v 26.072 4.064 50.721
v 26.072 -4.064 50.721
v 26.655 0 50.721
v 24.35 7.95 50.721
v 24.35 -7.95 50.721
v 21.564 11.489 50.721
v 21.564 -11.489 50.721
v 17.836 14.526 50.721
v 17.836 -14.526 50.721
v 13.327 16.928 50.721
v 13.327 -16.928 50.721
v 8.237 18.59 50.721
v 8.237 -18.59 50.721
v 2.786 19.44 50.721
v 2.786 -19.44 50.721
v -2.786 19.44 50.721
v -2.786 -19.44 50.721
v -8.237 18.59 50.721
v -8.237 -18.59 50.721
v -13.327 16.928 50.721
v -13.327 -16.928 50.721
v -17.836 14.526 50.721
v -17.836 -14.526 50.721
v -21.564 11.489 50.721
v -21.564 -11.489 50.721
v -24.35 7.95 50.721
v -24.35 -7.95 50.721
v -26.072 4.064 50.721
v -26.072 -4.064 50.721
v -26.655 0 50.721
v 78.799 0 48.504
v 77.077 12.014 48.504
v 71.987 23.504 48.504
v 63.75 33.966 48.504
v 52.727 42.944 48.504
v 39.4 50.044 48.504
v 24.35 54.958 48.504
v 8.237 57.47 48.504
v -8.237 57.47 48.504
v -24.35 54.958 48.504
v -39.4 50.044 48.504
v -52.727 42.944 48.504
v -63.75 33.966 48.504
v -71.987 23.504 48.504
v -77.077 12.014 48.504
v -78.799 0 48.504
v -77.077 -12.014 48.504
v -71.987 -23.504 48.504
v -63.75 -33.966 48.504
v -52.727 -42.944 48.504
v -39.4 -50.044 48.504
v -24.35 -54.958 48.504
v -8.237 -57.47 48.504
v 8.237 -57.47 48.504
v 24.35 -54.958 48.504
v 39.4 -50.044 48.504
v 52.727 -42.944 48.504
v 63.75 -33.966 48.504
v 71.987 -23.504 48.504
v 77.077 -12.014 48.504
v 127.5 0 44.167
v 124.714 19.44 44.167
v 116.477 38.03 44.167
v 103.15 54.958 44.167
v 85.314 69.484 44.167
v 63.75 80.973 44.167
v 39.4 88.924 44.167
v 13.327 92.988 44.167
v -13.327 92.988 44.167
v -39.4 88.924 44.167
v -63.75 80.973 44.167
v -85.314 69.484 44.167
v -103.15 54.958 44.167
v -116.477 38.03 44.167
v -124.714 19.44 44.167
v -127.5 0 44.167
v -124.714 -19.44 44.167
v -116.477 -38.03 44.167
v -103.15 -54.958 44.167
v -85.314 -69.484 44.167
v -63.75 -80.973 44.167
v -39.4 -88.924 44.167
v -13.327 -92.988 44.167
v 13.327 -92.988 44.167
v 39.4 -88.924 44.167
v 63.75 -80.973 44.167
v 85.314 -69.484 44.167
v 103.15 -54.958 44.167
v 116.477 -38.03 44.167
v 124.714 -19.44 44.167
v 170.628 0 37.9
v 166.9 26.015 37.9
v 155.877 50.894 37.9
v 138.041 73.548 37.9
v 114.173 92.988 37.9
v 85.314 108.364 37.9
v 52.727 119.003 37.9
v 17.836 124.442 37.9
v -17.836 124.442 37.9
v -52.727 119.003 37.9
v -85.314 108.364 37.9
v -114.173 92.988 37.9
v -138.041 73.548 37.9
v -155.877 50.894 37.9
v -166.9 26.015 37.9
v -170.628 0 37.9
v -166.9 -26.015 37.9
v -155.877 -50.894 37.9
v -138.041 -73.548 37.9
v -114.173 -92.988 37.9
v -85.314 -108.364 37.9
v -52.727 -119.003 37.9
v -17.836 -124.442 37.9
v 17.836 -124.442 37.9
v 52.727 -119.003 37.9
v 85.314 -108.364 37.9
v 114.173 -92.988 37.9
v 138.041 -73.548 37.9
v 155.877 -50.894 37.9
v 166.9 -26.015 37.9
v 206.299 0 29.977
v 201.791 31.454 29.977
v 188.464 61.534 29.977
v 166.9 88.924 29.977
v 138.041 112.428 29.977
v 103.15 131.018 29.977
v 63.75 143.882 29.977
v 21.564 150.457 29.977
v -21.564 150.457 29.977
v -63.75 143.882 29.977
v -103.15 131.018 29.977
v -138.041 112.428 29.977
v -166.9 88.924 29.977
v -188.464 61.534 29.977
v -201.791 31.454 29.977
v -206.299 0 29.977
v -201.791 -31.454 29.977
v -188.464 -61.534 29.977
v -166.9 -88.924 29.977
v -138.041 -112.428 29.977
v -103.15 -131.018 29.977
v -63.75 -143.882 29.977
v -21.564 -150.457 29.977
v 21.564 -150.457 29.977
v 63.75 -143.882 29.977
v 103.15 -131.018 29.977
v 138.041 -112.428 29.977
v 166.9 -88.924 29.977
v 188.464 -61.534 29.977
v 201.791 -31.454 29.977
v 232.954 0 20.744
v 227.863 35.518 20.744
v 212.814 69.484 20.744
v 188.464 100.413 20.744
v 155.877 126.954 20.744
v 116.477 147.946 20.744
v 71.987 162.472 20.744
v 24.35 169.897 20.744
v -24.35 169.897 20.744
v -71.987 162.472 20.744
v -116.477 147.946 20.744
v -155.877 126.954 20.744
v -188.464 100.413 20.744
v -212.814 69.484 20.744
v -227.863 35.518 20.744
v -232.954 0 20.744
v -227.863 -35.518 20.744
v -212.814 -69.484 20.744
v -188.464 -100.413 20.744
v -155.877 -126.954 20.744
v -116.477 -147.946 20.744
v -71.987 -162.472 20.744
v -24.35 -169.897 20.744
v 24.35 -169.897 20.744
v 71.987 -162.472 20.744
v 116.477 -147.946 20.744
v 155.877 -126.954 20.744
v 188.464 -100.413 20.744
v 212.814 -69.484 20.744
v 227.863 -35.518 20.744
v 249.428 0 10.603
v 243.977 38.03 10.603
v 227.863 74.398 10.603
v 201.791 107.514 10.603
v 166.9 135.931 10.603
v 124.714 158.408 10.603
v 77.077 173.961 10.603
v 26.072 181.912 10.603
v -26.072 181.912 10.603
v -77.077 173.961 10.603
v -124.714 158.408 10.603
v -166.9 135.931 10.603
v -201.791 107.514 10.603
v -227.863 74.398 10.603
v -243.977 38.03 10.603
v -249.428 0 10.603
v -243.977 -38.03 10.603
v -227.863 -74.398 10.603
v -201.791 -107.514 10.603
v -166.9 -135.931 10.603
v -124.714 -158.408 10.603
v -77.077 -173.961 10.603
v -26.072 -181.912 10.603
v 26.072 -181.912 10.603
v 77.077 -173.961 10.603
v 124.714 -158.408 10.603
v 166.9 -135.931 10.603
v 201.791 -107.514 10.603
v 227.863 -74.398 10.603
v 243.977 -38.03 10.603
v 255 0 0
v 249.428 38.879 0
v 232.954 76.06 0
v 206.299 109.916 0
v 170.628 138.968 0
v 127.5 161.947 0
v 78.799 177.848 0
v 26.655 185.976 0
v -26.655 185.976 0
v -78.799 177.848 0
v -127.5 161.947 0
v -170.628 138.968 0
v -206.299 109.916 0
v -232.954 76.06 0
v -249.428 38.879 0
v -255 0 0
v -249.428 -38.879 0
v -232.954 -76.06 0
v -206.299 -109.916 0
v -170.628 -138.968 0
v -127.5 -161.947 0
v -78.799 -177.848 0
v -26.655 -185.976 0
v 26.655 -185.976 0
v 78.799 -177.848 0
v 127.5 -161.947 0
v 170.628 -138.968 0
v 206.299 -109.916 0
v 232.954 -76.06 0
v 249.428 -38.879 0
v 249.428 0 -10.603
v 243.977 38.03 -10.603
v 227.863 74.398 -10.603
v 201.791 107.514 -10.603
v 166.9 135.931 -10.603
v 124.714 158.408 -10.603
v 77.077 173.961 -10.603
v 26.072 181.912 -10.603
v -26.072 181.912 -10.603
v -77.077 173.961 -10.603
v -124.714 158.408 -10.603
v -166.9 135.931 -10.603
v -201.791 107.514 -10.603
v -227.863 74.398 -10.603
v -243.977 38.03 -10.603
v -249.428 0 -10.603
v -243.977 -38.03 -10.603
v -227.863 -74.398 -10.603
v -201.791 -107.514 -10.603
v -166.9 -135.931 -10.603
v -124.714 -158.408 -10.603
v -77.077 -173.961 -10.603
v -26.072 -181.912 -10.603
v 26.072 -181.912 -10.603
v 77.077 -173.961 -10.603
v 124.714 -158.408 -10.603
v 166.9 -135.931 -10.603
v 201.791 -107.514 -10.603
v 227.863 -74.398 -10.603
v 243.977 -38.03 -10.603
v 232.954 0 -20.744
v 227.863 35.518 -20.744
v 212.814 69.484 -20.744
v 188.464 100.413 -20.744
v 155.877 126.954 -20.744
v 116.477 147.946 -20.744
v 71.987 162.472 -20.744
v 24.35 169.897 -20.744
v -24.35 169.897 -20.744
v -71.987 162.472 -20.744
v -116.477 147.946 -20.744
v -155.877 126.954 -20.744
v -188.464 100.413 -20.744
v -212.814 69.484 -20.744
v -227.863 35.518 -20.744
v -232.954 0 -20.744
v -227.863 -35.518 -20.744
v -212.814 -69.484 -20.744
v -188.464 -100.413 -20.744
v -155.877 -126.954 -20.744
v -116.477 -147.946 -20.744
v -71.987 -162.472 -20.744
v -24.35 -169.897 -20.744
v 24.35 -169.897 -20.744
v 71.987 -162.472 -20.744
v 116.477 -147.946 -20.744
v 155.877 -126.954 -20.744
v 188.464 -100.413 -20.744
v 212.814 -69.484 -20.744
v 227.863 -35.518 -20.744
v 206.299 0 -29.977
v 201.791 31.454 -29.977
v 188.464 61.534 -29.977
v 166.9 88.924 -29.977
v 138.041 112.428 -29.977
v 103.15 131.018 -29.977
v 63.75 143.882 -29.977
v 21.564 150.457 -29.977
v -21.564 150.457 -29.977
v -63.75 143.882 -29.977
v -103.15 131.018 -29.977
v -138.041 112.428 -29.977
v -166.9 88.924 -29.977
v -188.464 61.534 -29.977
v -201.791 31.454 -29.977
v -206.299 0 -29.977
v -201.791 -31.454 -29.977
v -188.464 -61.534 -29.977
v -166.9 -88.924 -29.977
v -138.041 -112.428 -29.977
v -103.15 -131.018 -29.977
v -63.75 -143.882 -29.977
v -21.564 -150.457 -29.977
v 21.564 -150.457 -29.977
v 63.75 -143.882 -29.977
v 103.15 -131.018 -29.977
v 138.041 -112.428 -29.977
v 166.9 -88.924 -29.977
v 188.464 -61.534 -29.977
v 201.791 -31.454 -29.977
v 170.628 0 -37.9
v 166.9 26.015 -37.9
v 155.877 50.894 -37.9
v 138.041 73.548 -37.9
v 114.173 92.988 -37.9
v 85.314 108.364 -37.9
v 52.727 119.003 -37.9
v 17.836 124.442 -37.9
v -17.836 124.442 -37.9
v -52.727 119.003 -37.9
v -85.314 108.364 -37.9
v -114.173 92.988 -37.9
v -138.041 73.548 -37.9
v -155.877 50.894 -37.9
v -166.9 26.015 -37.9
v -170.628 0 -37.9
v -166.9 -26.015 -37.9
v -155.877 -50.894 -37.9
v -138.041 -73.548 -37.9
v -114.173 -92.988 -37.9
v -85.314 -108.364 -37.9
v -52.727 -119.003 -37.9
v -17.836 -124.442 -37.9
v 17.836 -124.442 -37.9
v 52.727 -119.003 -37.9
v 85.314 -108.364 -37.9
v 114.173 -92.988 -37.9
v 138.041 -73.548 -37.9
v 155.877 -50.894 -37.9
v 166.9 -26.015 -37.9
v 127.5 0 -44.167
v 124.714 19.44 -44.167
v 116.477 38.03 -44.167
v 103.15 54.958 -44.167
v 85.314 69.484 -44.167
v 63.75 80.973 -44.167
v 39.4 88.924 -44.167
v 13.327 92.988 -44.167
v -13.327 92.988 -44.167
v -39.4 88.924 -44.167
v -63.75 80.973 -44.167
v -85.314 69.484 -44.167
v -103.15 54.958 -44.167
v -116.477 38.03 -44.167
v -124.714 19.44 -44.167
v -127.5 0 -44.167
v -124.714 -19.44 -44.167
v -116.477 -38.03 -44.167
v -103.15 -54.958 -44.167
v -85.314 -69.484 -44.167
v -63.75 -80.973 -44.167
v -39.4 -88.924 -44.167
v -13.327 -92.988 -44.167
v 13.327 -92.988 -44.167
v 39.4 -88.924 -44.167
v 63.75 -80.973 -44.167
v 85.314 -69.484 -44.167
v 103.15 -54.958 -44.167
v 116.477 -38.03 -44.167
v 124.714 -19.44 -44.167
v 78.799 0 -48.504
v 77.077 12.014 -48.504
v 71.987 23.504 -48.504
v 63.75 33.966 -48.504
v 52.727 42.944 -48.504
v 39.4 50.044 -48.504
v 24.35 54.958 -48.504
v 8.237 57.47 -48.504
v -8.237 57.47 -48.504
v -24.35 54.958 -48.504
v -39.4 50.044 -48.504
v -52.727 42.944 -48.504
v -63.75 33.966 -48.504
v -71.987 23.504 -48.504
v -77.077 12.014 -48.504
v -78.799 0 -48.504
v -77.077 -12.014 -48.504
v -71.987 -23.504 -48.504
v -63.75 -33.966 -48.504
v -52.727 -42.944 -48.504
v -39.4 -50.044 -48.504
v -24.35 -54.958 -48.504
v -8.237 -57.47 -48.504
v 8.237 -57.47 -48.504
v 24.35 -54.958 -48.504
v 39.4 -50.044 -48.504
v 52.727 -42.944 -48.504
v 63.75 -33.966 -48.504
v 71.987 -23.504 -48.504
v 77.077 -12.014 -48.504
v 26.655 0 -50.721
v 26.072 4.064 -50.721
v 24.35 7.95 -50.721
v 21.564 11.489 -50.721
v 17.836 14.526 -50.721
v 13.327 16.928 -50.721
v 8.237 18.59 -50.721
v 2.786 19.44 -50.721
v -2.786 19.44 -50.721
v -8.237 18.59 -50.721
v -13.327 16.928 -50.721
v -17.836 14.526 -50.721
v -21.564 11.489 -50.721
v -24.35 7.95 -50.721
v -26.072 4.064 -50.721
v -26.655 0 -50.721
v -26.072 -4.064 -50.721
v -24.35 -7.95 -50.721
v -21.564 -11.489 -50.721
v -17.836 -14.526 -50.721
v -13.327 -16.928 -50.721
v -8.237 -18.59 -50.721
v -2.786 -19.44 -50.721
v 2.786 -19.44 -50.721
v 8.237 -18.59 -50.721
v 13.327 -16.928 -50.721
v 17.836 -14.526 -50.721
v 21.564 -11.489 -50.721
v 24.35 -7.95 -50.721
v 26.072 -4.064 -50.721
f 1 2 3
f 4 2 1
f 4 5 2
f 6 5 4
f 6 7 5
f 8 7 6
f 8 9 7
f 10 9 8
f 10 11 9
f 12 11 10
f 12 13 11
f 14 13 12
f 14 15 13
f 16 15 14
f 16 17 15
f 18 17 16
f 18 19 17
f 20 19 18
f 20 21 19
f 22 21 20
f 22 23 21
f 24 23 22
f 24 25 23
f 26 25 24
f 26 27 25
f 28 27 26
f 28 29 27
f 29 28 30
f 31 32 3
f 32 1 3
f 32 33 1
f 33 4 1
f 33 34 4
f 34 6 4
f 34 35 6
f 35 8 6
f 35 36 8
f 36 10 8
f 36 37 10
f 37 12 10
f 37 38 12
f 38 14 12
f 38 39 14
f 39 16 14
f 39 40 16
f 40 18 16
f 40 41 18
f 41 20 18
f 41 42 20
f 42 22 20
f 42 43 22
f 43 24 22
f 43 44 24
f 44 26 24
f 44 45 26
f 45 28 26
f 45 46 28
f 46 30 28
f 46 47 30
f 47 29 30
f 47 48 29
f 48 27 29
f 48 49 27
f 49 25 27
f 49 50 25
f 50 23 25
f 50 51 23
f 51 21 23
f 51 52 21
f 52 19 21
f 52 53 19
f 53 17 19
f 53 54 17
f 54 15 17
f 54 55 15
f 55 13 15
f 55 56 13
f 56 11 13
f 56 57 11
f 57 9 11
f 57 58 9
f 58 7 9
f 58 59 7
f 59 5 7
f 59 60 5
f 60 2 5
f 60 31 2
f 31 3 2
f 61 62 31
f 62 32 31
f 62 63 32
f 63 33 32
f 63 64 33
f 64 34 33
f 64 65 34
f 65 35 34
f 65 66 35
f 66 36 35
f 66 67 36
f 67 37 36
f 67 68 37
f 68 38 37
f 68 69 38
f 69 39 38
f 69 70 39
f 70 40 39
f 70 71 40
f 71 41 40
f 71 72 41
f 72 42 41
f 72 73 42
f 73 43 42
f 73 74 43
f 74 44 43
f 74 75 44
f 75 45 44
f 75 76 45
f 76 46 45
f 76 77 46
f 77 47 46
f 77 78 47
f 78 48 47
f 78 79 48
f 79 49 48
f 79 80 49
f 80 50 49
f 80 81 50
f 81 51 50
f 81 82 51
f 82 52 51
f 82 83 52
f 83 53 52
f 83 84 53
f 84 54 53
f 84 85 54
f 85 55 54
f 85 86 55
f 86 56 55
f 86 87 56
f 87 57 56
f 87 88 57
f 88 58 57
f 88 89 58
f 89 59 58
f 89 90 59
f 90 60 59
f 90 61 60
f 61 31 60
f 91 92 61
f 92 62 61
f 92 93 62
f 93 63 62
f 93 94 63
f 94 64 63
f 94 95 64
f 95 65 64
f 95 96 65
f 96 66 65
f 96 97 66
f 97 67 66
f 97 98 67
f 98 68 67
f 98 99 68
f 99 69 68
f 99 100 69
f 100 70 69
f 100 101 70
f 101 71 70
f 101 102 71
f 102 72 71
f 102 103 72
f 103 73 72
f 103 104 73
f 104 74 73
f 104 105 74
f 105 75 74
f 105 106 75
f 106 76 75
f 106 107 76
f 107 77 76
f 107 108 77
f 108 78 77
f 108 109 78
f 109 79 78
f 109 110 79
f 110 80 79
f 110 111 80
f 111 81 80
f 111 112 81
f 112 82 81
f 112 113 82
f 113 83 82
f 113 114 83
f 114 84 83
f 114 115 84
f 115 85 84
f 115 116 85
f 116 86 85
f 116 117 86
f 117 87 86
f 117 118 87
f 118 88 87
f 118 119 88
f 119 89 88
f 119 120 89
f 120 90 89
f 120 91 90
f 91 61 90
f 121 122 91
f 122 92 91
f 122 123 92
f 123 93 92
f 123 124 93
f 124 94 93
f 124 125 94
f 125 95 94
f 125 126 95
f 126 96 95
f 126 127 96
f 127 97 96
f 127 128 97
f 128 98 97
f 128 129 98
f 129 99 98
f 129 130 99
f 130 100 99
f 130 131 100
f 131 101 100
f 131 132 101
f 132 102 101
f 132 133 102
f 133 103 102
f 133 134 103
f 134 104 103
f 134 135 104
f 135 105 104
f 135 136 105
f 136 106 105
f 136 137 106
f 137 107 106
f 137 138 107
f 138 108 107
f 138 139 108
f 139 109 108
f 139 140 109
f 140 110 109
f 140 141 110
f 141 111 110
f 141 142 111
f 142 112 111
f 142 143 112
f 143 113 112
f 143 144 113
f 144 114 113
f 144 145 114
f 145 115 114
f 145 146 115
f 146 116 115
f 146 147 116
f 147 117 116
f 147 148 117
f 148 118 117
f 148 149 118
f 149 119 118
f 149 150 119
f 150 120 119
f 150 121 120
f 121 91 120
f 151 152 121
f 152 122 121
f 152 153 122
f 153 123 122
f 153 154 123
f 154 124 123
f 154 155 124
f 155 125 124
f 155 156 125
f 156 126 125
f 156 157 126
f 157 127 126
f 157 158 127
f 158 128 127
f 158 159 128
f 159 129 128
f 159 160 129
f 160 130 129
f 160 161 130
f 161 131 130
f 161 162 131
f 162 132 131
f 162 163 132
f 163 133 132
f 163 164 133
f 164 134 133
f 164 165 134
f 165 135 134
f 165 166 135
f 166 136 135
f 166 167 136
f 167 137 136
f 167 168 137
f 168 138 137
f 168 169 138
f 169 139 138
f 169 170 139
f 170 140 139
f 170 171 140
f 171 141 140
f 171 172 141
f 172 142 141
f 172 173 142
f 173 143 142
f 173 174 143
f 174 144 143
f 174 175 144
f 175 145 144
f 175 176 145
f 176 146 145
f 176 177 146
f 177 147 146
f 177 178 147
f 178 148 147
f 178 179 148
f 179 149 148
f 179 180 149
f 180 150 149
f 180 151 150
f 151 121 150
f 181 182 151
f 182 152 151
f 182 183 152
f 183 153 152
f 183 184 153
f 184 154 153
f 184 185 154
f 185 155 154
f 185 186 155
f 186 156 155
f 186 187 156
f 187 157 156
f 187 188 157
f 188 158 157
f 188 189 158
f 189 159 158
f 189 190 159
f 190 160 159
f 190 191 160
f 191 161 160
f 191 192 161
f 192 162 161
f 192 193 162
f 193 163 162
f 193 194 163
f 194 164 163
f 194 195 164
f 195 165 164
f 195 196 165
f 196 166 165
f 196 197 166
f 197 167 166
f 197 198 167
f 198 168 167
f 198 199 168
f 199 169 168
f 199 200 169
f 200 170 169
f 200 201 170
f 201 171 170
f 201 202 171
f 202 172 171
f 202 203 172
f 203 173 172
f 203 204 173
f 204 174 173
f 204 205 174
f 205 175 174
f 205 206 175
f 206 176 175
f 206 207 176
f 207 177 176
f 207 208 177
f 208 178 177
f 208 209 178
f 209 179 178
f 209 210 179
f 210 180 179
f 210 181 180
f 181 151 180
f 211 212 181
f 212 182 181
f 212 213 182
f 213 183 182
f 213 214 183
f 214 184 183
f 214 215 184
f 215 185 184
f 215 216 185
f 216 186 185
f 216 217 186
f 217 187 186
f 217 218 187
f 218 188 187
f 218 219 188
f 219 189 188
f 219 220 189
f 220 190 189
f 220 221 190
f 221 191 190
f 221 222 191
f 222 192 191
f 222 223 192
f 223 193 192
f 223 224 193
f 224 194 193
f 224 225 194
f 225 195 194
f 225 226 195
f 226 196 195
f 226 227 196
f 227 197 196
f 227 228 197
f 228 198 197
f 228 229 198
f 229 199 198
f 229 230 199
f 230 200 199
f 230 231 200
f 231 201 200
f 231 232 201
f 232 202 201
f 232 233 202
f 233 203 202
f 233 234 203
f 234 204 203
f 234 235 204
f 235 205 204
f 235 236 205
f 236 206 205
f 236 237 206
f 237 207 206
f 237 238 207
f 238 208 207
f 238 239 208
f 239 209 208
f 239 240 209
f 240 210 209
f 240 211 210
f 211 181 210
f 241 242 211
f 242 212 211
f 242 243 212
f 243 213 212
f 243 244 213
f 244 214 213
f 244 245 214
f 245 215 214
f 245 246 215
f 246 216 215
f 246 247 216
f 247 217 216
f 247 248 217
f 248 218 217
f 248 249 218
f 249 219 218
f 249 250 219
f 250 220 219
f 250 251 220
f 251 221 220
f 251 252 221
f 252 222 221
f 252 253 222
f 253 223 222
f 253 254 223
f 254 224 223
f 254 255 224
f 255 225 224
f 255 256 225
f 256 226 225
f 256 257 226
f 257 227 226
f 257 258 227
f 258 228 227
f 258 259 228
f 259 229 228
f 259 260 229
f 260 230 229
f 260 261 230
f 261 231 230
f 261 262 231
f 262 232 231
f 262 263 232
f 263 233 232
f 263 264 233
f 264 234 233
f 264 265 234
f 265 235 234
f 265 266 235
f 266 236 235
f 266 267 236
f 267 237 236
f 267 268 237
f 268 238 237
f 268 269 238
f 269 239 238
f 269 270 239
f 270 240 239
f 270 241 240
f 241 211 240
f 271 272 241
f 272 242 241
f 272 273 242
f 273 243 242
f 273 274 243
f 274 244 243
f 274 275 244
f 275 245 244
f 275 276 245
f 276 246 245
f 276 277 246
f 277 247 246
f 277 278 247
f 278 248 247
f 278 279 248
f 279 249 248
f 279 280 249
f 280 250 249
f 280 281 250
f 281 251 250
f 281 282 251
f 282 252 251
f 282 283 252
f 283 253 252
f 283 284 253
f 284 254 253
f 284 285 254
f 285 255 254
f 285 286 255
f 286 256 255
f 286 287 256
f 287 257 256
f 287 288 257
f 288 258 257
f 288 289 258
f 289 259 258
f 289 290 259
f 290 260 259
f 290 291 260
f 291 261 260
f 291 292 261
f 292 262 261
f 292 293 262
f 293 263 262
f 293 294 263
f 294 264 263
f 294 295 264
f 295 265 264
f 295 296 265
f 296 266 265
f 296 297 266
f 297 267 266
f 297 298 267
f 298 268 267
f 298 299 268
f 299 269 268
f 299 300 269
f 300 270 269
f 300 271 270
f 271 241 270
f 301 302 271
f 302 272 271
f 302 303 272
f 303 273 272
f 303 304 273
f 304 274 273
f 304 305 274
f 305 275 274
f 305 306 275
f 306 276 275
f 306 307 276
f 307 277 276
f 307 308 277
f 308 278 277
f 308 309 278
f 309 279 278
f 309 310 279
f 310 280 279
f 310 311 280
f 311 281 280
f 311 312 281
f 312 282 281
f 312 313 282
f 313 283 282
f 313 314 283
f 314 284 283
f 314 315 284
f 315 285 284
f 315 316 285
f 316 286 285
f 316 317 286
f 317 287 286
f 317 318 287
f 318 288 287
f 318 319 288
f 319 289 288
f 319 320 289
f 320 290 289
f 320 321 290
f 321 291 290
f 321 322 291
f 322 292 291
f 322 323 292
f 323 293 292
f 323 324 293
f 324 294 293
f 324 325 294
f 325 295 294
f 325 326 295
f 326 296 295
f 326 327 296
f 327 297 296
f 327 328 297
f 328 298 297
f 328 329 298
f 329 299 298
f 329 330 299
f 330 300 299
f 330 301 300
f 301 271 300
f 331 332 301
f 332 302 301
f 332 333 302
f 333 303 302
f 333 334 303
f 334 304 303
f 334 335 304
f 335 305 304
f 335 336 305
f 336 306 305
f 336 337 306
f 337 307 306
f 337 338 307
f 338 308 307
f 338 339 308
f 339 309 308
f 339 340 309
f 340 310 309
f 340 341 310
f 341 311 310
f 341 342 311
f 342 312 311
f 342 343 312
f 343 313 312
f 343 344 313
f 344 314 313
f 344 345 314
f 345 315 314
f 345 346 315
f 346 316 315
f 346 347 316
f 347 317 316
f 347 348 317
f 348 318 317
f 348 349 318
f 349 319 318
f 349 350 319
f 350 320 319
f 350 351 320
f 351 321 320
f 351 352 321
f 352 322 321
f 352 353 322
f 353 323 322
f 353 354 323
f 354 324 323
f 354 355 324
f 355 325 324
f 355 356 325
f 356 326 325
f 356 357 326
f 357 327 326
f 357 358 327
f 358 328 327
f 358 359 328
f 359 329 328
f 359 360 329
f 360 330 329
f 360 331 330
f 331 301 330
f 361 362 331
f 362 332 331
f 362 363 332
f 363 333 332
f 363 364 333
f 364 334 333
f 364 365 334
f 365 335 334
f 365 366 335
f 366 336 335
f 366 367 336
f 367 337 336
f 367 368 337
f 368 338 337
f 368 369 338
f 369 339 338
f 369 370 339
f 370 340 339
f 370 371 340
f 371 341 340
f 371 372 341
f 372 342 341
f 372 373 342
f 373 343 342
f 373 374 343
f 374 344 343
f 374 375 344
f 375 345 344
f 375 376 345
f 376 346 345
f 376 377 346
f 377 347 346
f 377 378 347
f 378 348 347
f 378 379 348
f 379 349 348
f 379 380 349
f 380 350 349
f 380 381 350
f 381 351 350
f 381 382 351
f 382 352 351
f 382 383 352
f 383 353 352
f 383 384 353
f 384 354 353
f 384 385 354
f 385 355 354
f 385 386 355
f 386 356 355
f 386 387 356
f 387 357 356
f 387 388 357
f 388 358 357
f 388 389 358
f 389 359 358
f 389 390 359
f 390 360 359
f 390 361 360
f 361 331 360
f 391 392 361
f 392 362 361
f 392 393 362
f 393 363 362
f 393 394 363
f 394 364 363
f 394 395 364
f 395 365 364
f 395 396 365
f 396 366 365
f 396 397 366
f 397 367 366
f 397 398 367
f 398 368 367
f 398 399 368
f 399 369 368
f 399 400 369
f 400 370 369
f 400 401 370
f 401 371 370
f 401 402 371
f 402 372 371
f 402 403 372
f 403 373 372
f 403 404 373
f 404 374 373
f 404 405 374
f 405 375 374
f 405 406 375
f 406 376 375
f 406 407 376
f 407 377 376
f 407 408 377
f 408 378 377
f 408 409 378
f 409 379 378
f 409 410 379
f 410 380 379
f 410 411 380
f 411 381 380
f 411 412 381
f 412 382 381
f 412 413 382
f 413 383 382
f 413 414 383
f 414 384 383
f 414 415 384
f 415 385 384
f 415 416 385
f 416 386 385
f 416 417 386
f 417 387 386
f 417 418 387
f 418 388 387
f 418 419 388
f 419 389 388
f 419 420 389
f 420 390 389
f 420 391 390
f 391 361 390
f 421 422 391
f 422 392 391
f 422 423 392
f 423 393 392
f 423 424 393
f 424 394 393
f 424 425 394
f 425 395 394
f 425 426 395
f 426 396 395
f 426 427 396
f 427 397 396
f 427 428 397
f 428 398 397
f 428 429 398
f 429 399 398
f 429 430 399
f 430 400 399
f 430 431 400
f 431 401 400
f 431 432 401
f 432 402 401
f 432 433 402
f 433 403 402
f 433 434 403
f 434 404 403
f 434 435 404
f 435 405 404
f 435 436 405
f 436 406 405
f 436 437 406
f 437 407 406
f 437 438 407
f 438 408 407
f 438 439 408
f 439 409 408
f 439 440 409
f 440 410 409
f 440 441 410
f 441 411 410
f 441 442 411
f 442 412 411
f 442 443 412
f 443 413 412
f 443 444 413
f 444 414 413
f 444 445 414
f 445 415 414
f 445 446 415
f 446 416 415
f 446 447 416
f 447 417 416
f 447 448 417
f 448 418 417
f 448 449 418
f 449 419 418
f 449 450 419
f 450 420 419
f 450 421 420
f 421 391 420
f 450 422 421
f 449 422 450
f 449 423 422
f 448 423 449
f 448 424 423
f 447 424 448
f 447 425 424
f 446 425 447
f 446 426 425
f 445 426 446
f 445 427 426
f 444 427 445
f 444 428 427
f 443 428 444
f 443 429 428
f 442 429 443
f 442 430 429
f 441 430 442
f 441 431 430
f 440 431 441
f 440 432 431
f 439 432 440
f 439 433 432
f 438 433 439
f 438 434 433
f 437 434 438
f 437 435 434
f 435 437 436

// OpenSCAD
// Generated by SolidPython 1.0.1 on 2020-07-29 00:46:52


scale(v = [15, 11, 3]) {
	sphere(r = 17);
}
/***********************************************
*********      SolidPython code:      **********
************************************************
 
# import packages: SolidPython
from solid import *
from solid.utils import *
from itertools import chain, combinations, permutations


class Resize:

    def __init__(self, scad_file):
        self.scad_file = scad_file
        #self.scad_file = import_scad(scad_file)
        # cone/cylinder param:
        self.r1 = 0
        self.r2 = 0
        self.h = 0
        # rectangular prism param:
        self.w = 0
        self.l = 0
        # ellipse param:
        self.r = 0

    # import OpenScad code (file name corresponds to shape)


    # classify shape + parameters
    def assign(self, param1, param2, param3):
        if self.scad_file == 'cone.scad':
            self.r1 = param1
            self.r2 = param2
            self.h = param3
        elif self.scad_file == 'cylinder.scad':
            self.r1 = param1
            self.r2 = param2
            self.h = param3
        elif self.scad_file == 'rectangularPrism.scad':
            self.h = param1
            self.l = param2
            self.w = param3
        else:
            self.r = param1
            self.h = param2

    # resize parameters
    def iterate(self):
        x = range(3, 20, 2)
        i = 1
        if self.scad_file == 'cone.scad':
            tempList = list(permutations(x, 2))
            for temp in tempList:
                param1 = temp[0]
                param2 = temp[1]
                filepath = 'produced_scad_files/' + 'cone' + str(param1) + '_' + str(param2) + '_' + '.scad'
                scad_render_to_file(cylinder(h=param1, r1=param2, r2=0), filepath)

        elif self.scad_file == 'cylinder.scad':
            tempList = list(permutations(x, 3))
            for temp in tempList:
                param1 = temp[0]
                param2 = temp[1]
                filepath = 'produced_scad_files/' + 'cylinder' + str(param1) + '_' + str(param2) + '_' + '.scad'
                scad_render_to_file(cylinder(h=param1, r1=param2, r2=param2), filepath)

        elif self.scad_file == 'rectangularPrism.scad':
            tempList = list(permutations(x, 3))
            for temp in tempList:
                param1 = temp[0]
                param2 = temp[1]
                param3 = temp[2]
                filepath = 'produced_scad_files/' + 'rectangularPrism' + str(param1) + '_' + str(param2) + '_' + str(
                    param3) + '.scad'
                scad_render_to_file(cube(size=(param1, param2, param3)), filepath)

        elif self.scad_file == 'ellipse.scad':
            tempList = list(permutations(x, 4))
            for temp in tempList:
                param1 = temp[0]
                param2 = temp[1]
                param3 = temp[2]
                param4 = temp[3]
                filepath = 'produced_scad_files/' + 'ellipse' + str(param1) + '_' + str(param2) + '_' + str(param3) + '_' + str(param4) + '.scad'
                scad_render_to_file(scale([param1, param2, param3])(sphere(r=param4)), filepath)

    def render_to_scadfile(self):
        scad_render_to_file(scad, 'example.scad') 
 
************************************************/
